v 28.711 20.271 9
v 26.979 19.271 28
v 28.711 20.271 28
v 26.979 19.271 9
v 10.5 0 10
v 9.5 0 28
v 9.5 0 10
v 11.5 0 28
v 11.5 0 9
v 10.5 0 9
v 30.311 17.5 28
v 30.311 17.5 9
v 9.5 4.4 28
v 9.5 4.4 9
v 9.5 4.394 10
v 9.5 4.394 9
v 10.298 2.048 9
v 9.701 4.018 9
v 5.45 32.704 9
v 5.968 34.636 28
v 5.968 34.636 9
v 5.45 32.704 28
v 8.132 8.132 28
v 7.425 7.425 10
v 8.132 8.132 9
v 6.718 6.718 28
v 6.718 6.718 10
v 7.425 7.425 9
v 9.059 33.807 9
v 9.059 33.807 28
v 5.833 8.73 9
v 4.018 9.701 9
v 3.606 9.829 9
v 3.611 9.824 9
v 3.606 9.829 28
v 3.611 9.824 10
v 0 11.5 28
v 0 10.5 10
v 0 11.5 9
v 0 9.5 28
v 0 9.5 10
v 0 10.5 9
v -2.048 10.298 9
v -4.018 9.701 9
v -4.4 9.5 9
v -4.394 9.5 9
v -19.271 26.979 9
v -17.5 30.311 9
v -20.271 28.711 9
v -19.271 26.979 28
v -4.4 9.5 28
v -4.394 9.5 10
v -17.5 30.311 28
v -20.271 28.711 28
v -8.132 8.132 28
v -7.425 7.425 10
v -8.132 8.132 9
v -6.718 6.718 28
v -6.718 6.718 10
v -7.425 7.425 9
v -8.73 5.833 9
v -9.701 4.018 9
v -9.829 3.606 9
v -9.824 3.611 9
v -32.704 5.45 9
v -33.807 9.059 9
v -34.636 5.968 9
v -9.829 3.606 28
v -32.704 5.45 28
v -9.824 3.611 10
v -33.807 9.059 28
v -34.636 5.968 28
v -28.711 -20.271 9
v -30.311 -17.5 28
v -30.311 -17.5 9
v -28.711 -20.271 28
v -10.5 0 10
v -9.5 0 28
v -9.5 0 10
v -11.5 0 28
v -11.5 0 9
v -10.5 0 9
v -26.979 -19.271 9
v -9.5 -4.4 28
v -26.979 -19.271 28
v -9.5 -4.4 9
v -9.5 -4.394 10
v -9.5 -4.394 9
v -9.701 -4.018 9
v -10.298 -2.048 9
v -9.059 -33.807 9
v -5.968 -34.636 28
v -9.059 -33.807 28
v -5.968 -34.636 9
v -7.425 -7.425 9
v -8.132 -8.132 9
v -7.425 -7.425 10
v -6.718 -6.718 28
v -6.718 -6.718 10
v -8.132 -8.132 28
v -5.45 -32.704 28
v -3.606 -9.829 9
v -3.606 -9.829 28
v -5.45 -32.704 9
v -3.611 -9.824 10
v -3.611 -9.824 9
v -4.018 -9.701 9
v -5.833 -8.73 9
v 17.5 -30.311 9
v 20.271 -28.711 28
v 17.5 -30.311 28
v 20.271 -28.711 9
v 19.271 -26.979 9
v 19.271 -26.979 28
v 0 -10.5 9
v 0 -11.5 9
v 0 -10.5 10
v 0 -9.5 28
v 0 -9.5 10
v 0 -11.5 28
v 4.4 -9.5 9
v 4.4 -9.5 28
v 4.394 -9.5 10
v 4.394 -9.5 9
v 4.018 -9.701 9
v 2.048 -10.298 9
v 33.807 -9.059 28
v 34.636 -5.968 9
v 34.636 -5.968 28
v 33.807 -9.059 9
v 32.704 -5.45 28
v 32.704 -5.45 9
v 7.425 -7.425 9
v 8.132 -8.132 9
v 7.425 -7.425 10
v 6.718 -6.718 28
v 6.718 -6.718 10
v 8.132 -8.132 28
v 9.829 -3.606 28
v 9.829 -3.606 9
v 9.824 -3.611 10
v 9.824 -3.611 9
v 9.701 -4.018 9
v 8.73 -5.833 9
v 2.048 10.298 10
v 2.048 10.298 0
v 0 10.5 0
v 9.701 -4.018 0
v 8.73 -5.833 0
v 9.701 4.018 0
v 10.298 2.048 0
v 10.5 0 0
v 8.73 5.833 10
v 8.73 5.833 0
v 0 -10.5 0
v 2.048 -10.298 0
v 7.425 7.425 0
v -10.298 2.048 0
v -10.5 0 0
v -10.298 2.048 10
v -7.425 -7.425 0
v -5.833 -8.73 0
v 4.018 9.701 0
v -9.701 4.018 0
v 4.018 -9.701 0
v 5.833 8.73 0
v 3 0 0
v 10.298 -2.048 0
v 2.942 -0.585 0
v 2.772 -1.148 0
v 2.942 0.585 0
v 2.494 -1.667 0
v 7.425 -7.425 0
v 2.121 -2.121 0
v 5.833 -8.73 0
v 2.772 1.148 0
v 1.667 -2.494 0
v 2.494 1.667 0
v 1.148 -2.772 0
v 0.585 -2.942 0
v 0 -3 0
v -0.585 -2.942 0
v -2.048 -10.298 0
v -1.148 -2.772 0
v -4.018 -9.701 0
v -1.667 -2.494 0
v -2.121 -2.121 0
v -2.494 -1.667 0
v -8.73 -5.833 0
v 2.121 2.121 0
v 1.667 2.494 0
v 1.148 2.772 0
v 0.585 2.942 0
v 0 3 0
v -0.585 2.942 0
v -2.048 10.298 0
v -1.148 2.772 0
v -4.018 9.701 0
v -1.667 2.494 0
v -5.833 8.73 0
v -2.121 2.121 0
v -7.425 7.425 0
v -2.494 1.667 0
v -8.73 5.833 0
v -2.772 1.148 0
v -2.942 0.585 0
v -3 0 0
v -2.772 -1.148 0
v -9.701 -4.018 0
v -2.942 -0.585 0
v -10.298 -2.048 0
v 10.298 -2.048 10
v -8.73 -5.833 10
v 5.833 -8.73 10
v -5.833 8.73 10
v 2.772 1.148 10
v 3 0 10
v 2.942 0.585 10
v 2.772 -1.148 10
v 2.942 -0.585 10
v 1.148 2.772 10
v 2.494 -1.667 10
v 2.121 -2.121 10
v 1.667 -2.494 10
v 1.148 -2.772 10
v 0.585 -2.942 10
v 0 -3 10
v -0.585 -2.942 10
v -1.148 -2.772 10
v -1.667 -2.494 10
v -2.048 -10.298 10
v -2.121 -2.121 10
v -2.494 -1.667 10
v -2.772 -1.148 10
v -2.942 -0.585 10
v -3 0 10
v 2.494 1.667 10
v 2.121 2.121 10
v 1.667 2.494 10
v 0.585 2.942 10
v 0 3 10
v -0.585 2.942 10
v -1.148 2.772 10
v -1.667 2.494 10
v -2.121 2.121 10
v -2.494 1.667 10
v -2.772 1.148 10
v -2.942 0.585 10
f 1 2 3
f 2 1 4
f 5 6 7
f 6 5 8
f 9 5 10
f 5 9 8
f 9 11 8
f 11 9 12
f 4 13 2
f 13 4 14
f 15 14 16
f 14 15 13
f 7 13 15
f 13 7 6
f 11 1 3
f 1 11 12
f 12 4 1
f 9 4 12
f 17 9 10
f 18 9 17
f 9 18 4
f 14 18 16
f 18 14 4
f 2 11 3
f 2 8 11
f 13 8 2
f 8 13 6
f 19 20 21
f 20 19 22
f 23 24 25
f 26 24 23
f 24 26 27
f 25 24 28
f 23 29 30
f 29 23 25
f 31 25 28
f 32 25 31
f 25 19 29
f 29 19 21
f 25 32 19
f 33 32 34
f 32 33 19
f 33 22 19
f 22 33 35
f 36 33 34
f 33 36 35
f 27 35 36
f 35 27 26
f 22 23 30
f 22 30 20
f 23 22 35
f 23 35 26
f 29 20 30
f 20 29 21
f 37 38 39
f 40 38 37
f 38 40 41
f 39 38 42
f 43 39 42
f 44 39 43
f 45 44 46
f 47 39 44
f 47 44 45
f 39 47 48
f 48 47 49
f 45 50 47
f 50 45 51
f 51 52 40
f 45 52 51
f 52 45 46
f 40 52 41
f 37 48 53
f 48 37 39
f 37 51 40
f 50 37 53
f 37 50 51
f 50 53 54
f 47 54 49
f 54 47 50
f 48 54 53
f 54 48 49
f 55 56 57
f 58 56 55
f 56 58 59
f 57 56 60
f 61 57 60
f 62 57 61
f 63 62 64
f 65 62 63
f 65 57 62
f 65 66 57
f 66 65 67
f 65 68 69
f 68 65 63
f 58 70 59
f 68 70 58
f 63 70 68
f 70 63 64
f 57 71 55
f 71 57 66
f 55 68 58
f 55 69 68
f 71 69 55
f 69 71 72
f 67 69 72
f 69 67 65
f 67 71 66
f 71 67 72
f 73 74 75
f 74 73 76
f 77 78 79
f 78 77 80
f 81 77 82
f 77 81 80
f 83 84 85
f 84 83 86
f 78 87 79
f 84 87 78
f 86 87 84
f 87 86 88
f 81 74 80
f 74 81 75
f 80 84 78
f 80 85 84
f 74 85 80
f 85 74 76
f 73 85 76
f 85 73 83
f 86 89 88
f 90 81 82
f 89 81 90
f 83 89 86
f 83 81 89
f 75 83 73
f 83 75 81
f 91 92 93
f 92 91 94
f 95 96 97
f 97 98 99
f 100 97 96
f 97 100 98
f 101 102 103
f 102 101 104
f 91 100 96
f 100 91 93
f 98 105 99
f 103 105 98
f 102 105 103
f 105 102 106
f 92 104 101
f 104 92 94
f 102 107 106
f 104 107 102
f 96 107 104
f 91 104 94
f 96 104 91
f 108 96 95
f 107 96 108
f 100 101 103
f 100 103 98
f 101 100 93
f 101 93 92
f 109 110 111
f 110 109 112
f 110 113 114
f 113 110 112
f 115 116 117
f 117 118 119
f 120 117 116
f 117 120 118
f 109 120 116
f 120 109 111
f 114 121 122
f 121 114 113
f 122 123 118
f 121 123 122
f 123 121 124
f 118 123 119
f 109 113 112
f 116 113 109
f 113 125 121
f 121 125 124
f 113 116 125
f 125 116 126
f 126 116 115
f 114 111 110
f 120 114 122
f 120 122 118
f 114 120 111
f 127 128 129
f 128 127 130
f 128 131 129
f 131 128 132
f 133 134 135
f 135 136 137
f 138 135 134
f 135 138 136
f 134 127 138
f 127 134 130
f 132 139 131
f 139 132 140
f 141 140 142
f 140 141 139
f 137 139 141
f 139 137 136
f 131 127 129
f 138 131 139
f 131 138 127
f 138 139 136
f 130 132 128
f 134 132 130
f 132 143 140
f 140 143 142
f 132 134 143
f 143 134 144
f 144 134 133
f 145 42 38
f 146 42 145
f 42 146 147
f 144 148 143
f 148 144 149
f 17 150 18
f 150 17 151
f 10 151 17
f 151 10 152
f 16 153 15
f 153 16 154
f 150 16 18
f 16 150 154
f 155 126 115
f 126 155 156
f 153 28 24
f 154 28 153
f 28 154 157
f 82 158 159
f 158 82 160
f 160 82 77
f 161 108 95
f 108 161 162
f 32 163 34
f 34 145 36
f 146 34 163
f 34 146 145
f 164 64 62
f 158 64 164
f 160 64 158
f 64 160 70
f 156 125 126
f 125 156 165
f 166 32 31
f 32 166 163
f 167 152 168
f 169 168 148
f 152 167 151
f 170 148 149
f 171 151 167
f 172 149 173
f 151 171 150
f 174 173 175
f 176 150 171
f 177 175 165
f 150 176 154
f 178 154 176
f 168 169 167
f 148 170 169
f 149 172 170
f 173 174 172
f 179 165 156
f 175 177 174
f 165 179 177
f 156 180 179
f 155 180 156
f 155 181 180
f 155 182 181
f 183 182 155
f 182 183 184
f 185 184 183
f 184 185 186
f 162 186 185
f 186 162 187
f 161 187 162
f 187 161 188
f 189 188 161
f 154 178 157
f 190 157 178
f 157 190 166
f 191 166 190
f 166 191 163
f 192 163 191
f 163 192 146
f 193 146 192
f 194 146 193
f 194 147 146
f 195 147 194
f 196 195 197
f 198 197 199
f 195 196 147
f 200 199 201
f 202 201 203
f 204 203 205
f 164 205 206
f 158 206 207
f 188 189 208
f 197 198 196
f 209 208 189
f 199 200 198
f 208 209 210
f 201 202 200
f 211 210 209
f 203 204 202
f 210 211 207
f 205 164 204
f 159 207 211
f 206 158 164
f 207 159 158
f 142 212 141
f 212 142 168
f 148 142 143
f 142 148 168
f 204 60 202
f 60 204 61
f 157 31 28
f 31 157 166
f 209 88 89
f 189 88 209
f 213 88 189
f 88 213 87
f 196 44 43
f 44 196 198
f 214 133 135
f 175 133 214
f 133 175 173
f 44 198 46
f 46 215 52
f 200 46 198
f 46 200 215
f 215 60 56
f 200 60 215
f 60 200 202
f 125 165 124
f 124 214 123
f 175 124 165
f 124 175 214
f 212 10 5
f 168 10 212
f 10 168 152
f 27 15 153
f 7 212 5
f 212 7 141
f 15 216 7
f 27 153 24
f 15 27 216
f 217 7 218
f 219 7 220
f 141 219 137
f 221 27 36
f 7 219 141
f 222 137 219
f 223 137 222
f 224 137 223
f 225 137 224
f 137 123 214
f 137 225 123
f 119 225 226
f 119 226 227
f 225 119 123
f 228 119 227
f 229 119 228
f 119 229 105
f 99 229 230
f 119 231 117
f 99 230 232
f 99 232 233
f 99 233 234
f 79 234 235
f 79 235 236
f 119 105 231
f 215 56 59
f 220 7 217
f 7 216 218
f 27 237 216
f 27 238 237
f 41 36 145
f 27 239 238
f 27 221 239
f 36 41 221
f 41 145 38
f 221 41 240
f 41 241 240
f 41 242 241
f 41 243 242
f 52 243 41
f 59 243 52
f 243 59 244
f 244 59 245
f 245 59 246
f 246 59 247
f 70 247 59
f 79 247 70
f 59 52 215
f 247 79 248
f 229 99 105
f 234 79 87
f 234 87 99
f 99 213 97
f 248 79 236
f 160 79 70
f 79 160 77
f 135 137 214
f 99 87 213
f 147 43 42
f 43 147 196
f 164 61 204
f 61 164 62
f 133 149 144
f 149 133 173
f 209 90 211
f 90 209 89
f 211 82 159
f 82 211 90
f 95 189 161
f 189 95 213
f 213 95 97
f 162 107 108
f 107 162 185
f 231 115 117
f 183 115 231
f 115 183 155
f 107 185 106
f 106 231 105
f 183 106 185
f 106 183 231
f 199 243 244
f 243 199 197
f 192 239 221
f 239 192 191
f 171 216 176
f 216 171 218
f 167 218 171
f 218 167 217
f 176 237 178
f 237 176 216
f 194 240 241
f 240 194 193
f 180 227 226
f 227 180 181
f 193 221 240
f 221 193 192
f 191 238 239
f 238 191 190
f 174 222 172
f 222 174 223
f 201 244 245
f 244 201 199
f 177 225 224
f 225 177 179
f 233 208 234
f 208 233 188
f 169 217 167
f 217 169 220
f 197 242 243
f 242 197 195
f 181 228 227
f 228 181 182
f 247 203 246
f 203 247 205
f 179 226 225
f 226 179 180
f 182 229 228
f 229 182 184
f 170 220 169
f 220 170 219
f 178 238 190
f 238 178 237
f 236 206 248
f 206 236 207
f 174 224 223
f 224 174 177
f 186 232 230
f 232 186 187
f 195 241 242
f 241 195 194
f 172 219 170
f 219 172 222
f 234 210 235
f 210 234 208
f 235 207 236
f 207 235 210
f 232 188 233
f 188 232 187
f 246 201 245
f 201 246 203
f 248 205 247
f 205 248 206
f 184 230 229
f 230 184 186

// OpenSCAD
$fn = 32;

// ----------------------------------------------------------------------
// Impeller: 70 mm, 8 blades, 28 mm tall
// ----------------------------------------------------------------------

// --- parameters (mm) ---
hub_d = 21;               // hub diameter
hub_h = 10;               // hub height
imp_d = 70;               // outer diameter over the blades
blades = 8;               // number of blades
blade_t = 2;              // blade thickness
blade_h = 18;             // blade height
blade_in_r = 9.5;         // blade root radius
blade_out_r = 33;         // blade tip radius
sweep = 30;               // blade sweep, degrees
bore_d = 6;               // shaft bore

module hub() {
  cylinder(h = hub_h, d = hub_d);
}

module blade() {
  /* blade swept between two boxes: hull of the root and the tip section */
  hull() {
    translate([blade_in_r, 0, hub_h - 1])
      cube([blade_t, blade_t * 2.2, blade_h + 1], center = false);
    rotate([0, 0, sweep])
      translate([blade_out_r, 0, hub_h - 1])
        cube([blade_t, blade_t * 1.6, blade_h + 1], center = false);
  }
}

module blades() {
  for (i = [0 : blades - 1])
    rotate([0, 0, i * 360 / blades]) blade();
}

difference() {
  union() {
    hub();
    blades();
  }
  translate([0, 0, -1]) cylinder(h = hub_h + blade_h + 0 + 3, d = bore_d);
}
